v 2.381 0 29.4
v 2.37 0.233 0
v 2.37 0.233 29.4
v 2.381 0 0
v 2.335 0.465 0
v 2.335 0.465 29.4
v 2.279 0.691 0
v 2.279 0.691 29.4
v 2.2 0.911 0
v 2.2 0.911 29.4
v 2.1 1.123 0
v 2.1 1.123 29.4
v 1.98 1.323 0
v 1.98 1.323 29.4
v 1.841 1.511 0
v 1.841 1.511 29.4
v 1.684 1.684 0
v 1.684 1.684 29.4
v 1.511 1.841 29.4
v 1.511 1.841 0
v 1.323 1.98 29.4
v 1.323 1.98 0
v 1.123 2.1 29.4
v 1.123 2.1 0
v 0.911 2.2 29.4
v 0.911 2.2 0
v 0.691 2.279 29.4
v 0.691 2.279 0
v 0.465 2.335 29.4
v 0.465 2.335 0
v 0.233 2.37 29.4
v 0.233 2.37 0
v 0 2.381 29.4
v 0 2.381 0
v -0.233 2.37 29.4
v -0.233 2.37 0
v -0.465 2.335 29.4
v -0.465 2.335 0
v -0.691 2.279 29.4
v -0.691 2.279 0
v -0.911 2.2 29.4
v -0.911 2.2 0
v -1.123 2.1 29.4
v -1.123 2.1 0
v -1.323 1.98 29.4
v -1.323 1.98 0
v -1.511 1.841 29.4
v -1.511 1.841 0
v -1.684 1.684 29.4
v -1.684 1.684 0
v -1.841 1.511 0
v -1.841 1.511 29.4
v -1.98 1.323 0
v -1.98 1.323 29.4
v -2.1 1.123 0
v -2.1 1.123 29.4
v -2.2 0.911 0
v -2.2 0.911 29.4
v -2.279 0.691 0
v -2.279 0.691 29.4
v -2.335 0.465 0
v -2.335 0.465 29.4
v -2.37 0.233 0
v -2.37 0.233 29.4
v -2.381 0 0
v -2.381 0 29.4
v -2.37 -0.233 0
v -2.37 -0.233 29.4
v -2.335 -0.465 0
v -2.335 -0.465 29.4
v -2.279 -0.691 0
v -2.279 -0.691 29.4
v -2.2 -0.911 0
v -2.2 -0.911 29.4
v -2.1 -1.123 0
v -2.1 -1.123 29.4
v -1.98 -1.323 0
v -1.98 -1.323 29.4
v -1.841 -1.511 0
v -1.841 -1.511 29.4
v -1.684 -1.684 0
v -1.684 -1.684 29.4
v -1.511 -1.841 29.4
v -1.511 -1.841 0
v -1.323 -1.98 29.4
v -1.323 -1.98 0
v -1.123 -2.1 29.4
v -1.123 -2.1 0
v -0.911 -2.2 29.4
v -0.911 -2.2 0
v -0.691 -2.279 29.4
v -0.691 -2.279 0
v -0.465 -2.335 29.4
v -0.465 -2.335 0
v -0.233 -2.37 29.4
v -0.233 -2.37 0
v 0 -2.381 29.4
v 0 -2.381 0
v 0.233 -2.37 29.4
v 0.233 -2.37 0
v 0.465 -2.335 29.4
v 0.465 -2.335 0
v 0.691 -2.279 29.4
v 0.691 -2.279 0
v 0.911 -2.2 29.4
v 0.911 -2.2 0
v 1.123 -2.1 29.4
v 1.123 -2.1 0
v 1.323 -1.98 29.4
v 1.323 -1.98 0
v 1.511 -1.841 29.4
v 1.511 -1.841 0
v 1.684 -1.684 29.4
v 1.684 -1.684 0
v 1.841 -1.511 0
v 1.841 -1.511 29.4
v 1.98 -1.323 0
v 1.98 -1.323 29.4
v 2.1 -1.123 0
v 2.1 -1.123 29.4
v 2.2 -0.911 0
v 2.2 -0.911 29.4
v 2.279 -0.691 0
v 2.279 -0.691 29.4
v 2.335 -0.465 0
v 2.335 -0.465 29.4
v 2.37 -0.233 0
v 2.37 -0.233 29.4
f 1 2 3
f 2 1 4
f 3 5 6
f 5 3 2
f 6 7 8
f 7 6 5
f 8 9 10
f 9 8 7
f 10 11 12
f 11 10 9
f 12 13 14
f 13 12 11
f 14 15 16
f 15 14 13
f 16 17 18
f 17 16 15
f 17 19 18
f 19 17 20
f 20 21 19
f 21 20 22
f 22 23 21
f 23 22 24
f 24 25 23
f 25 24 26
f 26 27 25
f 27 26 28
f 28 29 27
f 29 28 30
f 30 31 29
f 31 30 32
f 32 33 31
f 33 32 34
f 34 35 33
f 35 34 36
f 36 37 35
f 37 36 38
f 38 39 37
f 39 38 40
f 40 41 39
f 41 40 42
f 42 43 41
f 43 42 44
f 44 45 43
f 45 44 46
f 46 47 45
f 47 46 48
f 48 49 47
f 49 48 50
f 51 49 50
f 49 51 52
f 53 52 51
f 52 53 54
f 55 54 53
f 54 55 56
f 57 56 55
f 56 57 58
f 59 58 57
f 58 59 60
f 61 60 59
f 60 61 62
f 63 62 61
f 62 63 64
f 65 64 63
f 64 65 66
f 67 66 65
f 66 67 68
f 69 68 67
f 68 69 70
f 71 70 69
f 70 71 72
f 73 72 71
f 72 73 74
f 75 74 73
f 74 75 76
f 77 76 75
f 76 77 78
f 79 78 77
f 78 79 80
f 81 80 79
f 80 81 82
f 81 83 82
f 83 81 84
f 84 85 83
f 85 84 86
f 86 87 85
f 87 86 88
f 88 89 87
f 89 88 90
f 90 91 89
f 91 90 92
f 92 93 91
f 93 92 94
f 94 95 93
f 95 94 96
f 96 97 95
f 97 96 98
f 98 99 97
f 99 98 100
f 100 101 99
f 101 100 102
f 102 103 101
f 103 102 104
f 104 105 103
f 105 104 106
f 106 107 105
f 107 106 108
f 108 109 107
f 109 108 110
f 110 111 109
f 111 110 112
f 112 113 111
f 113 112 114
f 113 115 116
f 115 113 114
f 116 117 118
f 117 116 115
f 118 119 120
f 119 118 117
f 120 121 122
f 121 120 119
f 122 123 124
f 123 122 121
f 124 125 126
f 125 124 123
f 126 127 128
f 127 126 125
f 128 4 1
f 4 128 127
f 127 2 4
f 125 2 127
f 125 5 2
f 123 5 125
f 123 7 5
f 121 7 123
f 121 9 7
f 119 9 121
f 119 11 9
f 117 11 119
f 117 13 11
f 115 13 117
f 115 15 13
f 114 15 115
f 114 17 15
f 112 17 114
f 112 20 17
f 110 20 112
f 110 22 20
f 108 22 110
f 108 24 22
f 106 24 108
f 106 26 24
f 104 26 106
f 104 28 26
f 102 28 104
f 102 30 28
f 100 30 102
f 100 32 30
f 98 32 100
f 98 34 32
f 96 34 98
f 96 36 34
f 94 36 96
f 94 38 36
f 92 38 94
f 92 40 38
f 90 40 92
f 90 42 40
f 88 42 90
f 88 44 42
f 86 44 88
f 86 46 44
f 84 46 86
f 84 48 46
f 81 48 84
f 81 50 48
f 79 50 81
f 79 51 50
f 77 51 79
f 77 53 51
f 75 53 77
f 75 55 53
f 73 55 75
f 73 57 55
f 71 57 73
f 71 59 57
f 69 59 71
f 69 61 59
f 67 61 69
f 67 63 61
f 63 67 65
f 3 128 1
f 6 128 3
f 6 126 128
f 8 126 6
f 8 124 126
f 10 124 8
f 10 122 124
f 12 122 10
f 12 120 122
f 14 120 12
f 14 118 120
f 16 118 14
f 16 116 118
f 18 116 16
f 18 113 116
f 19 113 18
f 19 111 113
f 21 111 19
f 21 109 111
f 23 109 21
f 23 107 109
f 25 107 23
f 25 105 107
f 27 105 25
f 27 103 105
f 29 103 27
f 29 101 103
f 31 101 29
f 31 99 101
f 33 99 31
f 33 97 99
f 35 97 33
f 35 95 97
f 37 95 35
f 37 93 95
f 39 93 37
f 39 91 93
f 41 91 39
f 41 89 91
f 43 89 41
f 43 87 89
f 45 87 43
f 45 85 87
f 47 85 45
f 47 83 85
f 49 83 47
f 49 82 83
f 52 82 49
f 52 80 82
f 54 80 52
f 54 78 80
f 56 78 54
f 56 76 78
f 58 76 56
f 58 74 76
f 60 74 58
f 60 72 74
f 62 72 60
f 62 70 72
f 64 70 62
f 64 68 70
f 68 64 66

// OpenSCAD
// Pegboard Glasses Holder (nose)

$fn = 64;

nose_len = 3.1;
nose_wid = 5;
nose_h = 5.0;
nose_scale = 9;
arms_nose_rest_dist = 33.0;
nose_ext_len = arms_nose_rest_dist+22.0;
back_thick = 5;
peg_hole_sep = 25.4;
peg_hole_dia = 6.0;


module noseIntersectCube() {
    scale(nose_scale)
    linear_extrude(nose_h)
    translate([0,-nose_wid/2])
    square([nose_len,nose_wid]);
}

module nose() {
    intersection() {
        scale(nose_scale)
        translate([-10.5,0,1.8])
        scale(100)
        rotate([90,0,-1.4])
        import("lawlorhead_10k.stl");
        noseIntersectCube();
    }
}
//nose();

rounding = 0;
module noseBaseProjection() {
    offset(-rounding) offset(rounding)
    offset(rounding) offset(-rounding)
    projection(cut=true)
    translate([0,0,-0.01])
    rotate([0,-90,0])
    nose();
}

module noseExtension() {
    translate([-nose_ext_len-back_thick,0,0])
    rotate([0,90,0])
    linear_extrude(nose_ext_len+back_thick)
    noseBaseProjection();
}
//noseExtension();
//nose();

module cutNoseExtension() {
    difference() {
        noseExtension();
        translate([-nose_ext_len,-nose_scale*nose_wid/2,nose_h/2*nose_scale])
        scale(nose_scale)
        linear_extrude(nose_h/2)
        square([(nose_ext_len-arms_nose_rest_dist)/nose_scale, nose_wid]);
    }
}
//cutNoseExtension();

module pegHoles() {
    translate([-nose_ext_len-back_thick+peg_hole_sep,0,nose_h*nose_scale/2])
    rotate([0,-90,0]) {
        translate([peg_hole_sep/2,0,0])
        cylinder(h=peg_hole_sep, d=peg_hole_dia);
        translate([-peg_hole_sep/2,0,0])
        cylinder(h=peg_hole_sep, d=peg_hole_dia);
    }
}

module noseGlassesHolder() {
    difference() {
        translate([0,2,0])
        union() {
            nose();
            cutNoseExtension();
        }
        pegHoles();
    }
}
//noseGlassesHolder();

peg_rod_dia = 4.7625;
peg_insert_dist = 10;
module pegRod() {
    cylinder(d=peg_rod_dia, h=back_thick+peg_rod_dia/2+2);
    translate([-peg_insert_dist/2,0,peg_rod_dia/4])
    cube([peg_insert_dist,peg_rod_dia,peg_rod_dia/2], center=true);
}
//pegRod();

cylinder(d=peg_rod_dia, h=25.4+4);
